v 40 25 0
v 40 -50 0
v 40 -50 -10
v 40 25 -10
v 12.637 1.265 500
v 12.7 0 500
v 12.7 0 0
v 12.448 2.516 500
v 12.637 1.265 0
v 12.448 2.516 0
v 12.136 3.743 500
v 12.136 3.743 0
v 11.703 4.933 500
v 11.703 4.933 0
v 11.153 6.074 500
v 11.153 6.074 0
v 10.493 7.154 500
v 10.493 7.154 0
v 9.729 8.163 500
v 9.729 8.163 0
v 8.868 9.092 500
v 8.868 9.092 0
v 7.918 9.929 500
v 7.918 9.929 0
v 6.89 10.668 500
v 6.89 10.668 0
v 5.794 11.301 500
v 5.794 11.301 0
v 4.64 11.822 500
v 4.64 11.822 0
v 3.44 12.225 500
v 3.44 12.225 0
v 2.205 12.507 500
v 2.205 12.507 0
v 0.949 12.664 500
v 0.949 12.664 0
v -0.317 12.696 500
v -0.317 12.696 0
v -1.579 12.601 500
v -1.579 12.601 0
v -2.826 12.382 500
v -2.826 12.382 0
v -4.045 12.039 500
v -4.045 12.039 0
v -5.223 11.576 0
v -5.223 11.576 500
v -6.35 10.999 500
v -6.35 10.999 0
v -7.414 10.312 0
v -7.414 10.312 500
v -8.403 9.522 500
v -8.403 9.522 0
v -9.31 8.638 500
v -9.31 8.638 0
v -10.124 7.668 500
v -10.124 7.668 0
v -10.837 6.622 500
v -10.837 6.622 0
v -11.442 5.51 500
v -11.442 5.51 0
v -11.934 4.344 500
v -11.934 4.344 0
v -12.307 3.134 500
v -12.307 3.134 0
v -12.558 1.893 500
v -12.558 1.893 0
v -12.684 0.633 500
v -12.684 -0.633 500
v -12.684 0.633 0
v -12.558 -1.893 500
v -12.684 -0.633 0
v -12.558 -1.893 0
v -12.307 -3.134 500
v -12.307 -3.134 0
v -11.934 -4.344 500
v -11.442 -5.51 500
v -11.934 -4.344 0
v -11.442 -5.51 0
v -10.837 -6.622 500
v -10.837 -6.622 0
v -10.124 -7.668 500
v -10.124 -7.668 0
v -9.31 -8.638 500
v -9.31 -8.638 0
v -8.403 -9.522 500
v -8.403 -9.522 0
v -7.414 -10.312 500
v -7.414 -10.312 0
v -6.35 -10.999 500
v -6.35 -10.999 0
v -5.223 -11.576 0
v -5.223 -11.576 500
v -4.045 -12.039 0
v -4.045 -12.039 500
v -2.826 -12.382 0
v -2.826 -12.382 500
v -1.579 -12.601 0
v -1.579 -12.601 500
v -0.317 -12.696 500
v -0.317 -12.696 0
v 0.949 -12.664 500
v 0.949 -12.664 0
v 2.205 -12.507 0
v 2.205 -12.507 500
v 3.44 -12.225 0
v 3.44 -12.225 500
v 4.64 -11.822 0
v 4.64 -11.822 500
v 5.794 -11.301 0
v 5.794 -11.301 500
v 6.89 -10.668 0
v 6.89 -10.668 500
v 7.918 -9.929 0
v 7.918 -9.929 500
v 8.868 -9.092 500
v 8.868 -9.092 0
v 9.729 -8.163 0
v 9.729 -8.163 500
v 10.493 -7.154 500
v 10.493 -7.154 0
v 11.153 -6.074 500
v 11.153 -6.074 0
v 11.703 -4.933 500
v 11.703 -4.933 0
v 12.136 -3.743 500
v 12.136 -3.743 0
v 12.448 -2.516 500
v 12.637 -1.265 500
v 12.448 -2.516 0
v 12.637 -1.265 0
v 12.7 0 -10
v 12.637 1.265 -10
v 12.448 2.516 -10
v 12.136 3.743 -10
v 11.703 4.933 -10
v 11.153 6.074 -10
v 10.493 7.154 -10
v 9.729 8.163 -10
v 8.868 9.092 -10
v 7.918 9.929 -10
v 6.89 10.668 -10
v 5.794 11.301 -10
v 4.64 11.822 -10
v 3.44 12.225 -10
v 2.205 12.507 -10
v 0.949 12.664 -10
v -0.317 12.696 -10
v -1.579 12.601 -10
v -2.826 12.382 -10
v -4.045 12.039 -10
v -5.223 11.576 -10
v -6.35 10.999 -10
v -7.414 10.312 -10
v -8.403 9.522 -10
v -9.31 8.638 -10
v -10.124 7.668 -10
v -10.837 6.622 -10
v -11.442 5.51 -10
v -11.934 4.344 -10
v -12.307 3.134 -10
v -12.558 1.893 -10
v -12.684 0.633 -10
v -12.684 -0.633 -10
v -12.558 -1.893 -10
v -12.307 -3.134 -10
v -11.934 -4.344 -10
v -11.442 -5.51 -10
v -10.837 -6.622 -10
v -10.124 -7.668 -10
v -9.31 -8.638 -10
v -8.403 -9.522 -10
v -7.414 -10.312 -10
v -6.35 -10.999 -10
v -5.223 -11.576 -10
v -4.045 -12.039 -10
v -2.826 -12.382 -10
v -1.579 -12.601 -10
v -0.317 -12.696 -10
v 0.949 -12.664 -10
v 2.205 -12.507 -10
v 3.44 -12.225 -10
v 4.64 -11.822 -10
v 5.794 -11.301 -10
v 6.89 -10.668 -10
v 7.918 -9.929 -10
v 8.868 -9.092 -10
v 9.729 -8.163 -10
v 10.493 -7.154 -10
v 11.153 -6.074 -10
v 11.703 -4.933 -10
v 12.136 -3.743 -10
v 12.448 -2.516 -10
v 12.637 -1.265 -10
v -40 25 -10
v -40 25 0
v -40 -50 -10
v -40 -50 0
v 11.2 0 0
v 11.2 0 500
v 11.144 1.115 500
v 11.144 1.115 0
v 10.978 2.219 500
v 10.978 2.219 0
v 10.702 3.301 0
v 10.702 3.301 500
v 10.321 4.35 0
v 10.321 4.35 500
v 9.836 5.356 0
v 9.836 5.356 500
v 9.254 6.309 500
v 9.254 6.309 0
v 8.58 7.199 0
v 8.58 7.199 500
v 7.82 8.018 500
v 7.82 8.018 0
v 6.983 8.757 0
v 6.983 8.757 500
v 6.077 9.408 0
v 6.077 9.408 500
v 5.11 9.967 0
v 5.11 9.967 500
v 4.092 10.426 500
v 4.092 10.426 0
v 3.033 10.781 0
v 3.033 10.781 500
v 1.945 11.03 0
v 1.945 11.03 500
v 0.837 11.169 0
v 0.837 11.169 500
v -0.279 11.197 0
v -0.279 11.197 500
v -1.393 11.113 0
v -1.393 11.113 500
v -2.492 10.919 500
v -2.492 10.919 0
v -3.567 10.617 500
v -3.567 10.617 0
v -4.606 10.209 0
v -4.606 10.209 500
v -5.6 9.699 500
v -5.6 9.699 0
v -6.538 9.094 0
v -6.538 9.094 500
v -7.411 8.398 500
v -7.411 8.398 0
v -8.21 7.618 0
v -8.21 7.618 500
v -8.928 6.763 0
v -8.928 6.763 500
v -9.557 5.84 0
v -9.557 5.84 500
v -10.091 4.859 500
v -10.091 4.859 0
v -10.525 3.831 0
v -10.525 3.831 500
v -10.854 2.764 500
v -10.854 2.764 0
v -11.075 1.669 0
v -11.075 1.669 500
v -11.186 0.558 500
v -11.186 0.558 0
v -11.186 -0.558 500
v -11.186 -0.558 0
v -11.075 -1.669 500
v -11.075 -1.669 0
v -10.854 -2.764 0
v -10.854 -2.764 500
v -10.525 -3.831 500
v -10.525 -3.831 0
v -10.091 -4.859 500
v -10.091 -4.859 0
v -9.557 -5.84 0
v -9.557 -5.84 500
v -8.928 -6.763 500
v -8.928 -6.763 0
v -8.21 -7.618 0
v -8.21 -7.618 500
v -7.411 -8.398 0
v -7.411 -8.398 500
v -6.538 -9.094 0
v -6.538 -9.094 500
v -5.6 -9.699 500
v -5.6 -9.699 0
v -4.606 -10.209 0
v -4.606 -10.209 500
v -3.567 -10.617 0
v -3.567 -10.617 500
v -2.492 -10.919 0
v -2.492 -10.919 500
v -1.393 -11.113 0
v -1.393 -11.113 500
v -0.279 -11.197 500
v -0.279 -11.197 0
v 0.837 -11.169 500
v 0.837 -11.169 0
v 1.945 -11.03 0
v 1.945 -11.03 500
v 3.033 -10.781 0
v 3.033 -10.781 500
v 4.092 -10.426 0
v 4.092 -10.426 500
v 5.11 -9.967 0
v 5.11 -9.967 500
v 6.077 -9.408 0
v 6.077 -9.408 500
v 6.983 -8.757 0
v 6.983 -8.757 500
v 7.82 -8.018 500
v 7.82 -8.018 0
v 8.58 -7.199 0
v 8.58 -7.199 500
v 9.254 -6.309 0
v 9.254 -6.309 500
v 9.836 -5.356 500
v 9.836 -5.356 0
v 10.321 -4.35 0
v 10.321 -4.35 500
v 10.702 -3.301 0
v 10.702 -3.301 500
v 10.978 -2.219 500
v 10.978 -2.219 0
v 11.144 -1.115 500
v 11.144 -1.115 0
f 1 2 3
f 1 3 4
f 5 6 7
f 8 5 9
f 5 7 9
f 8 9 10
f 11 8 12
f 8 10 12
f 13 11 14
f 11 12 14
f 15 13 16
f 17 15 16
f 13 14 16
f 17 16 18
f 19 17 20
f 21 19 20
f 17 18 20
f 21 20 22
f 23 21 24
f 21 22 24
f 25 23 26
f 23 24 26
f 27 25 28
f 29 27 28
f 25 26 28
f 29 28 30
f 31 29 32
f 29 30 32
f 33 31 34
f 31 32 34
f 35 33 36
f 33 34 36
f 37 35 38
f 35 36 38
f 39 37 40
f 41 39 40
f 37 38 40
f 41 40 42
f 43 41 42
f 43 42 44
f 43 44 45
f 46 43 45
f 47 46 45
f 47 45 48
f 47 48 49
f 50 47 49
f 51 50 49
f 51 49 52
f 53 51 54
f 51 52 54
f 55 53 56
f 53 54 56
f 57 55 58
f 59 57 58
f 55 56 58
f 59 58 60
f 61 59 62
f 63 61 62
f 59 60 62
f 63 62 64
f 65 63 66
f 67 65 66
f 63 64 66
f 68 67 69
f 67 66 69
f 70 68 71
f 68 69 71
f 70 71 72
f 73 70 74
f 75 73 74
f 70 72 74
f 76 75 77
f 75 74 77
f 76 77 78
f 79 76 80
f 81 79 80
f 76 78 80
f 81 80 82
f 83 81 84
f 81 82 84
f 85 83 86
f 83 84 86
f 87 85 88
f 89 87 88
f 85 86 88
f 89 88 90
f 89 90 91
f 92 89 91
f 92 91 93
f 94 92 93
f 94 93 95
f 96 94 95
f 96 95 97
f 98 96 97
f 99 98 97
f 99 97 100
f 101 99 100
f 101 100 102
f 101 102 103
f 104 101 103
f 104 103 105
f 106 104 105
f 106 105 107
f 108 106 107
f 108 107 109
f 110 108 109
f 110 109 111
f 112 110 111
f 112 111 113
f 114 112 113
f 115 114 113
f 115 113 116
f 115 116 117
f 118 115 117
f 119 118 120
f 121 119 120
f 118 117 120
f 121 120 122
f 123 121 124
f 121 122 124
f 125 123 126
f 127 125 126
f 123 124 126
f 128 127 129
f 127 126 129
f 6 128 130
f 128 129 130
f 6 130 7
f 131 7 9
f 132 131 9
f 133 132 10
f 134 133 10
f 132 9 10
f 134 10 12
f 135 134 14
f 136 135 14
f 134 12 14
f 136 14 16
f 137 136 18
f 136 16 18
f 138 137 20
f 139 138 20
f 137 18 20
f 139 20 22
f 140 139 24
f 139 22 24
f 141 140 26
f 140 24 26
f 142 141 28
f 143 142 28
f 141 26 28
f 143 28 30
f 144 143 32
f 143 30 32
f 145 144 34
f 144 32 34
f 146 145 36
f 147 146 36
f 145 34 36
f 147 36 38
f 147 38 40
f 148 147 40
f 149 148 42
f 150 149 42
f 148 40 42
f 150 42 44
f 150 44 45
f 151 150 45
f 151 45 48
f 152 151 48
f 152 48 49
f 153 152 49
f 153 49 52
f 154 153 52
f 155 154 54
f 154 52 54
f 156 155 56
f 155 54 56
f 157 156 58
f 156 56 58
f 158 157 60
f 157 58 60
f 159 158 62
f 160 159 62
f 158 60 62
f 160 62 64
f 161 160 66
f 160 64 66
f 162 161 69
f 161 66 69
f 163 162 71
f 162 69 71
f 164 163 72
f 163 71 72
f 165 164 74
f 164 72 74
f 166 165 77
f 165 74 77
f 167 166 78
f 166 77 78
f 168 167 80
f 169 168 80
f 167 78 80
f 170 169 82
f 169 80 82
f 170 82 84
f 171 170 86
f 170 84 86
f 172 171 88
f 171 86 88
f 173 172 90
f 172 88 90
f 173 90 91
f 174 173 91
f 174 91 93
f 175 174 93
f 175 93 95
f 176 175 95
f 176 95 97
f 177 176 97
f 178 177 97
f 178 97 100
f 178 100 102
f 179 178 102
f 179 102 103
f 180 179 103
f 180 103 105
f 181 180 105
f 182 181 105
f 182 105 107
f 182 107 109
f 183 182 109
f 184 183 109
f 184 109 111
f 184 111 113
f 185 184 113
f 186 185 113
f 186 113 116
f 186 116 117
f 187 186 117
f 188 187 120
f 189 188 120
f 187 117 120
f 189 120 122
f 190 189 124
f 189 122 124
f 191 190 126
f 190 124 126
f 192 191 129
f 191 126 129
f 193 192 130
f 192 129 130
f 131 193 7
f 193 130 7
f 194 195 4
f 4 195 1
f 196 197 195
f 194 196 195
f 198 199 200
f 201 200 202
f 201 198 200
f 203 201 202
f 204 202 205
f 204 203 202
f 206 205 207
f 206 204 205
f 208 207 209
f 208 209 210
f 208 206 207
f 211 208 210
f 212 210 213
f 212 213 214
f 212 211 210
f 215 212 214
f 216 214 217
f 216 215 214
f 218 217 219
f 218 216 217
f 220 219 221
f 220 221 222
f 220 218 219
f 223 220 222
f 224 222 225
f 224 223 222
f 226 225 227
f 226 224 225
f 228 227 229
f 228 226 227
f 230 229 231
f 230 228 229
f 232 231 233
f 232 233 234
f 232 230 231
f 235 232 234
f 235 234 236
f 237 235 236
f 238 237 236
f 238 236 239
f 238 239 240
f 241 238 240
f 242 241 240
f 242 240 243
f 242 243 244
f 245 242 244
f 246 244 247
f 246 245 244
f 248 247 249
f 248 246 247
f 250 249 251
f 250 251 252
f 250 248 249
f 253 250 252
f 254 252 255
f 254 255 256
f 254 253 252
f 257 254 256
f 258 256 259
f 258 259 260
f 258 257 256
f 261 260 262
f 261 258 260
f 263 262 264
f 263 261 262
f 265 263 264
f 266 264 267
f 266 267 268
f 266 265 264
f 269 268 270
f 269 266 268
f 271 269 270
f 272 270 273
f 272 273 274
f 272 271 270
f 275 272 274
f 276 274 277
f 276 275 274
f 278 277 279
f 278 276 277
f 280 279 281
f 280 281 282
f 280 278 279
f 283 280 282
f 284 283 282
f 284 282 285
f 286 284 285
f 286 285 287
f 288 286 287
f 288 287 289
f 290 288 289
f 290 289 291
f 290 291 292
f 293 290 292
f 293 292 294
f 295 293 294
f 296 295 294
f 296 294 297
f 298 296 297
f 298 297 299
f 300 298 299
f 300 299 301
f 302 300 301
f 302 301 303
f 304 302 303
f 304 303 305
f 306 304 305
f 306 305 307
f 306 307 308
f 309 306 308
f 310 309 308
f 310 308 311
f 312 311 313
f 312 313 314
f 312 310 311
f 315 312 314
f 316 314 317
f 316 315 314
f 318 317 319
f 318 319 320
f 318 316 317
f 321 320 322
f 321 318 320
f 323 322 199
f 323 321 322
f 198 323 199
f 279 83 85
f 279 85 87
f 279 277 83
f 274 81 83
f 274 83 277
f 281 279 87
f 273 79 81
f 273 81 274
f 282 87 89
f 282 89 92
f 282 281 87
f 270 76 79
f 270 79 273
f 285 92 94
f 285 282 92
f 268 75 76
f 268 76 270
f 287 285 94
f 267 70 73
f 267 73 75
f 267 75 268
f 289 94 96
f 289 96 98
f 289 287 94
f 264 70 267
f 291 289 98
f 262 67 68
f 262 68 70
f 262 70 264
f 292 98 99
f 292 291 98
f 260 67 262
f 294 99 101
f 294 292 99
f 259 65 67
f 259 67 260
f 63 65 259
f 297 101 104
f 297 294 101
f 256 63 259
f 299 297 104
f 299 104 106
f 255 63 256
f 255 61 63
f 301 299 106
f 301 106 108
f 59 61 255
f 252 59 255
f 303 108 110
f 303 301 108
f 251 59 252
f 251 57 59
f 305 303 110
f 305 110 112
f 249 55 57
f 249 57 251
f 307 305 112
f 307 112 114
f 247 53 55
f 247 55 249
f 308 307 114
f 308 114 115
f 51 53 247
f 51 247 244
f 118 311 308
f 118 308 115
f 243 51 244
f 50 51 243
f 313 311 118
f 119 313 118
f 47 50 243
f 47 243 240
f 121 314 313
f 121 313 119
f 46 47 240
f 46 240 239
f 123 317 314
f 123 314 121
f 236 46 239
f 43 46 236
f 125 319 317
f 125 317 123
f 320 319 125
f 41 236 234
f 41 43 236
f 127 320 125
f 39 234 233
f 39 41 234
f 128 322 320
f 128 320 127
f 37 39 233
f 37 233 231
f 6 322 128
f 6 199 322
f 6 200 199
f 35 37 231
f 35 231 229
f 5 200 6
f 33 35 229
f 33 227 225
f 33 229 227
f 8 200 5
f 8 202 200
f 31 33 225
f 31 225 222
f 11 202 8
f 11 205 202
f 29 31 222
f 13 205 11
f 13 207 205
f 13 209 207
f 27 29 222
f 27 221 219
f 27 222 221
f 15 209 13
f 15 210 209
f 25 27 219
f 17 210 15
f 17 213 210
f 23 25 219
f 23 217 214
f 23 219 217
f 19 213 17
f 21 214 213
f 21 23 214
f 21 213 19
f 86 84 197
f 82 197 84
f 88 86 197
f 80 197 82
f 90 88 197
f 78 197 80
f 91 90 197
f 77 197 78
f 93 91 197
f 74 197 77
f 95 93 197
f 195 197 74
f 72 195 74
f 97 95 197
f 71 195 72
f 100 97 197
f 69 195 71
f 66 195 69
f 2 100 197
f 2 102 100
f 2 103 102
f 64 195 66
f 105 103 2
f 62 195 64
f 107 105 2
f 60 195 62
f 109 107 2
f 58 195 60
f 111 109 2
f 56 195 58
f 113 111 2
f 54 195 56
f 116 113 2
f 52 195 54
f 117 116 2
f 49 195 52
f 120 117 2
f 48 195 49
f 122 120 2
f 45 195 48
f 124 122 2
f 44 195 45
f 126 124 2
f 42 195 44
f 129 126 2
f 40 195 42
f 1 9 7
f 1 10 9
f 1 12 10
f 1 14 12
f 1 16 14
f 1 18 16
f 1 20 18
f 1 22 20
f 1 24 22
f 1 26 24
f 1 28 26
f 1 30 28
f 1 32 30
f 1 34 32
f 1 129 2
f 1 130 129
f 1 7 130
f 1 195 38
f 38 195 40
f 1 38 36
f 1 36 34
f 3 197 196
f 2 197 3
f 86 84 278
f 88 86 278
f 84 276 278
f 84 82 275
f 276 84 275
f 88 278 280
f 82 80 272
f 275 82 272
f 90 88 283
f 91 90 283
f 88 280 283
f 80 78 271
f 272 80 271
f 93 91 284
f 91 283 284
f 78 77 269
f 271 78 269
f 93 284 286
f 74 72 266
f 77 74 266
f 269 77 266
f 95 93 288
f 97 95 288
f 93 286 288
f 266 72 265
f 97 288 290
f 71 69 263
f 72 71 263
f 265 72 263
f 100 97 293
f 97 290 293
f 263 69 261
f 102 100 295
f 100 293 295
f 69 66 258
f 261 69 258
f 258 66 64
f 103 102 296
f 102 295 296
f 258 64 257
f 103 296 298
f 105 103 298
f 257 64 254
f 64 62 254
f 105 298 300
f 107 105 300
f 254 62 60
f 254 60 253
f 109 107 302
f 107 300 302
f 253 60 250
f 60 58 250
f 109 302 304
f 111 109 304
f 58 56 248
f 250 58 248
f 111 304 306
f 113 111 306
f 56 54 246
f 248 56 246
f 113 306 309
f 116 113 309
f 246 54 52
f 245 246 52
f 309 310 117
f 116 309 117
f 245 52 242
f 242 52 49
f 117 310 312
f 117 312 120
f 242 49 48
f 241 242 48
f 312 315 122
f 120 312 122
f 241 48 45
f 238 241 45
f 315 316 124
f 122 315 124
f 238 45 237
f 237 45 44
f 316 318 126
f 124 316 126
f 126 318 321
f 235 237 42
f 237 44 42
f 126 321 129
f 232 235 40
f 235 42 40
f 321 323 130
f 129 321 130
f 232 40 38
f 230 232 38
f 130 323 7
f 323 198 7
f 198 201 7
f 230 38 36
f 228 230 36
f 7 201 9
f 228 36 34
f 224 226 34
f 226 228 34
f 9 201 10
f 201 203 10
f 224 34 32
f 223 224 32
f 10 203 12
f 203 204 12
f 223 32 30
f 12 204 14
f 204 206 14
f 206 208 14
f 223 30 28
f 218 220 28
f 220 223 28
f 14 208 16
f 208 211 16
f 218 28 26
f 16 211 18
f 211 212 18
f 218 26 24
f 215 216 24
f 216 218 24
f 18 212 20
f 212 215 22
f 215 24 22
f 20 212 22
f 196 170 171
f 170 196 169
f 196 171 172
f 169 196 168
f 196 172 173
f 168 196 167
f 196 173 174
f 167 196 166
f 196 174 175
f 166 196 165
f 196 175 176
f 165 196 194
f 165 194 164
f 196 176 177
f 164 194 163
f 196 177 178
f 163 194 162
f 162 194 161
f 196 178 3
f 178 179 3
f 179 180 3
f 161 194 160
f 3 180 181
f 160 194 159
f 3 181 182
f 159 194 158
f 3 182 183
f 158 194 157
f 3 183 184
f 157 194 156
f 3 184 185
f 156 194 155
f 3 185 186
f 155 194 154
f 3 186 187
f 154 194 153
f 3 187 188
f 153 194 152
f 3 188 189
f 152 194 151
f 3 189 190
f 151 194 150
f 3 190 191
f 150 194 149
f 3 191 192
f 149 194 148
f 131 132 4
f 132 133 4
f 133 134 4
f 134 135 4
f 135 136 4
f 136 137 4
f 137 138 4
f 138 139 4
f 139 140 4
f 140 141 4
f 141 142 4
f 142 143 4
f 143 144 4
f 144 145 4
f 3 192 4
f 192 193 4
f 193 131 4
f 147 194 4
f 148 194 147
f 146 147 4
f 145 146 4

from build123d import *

# Parameters (mm, degrees)
F0_R     = 12.7
F0_R_2   = 11.2
F1_DEPTH = 500
F2_W     = 80
F2_H     = 75
F2_R     = 12.7
F3_DEPTH = 10


with BuildPart() as f1:
    # F0 (on Top) → F1 (new body)
    with BuildSketch(Plane.XY):
        Circle(F0_R)
        Circle(F0_R_2, mode=Mode.SUBTRACT)
    extrude(amount=F1_DEPTH)


with BuildPart() as f3:
    # F2 (on Top) → F3 (new body)
    with BuildSketch(Plane.XY):
        with Locations((0, -12.5)):
            Rectangle(F2_W, F2_H)
        Circle(F2_R, mode=Mode.SUBTRACT)
    extrude(amount=-F3_DEPTH)


solid = Compound([f1.part, f3.part])
